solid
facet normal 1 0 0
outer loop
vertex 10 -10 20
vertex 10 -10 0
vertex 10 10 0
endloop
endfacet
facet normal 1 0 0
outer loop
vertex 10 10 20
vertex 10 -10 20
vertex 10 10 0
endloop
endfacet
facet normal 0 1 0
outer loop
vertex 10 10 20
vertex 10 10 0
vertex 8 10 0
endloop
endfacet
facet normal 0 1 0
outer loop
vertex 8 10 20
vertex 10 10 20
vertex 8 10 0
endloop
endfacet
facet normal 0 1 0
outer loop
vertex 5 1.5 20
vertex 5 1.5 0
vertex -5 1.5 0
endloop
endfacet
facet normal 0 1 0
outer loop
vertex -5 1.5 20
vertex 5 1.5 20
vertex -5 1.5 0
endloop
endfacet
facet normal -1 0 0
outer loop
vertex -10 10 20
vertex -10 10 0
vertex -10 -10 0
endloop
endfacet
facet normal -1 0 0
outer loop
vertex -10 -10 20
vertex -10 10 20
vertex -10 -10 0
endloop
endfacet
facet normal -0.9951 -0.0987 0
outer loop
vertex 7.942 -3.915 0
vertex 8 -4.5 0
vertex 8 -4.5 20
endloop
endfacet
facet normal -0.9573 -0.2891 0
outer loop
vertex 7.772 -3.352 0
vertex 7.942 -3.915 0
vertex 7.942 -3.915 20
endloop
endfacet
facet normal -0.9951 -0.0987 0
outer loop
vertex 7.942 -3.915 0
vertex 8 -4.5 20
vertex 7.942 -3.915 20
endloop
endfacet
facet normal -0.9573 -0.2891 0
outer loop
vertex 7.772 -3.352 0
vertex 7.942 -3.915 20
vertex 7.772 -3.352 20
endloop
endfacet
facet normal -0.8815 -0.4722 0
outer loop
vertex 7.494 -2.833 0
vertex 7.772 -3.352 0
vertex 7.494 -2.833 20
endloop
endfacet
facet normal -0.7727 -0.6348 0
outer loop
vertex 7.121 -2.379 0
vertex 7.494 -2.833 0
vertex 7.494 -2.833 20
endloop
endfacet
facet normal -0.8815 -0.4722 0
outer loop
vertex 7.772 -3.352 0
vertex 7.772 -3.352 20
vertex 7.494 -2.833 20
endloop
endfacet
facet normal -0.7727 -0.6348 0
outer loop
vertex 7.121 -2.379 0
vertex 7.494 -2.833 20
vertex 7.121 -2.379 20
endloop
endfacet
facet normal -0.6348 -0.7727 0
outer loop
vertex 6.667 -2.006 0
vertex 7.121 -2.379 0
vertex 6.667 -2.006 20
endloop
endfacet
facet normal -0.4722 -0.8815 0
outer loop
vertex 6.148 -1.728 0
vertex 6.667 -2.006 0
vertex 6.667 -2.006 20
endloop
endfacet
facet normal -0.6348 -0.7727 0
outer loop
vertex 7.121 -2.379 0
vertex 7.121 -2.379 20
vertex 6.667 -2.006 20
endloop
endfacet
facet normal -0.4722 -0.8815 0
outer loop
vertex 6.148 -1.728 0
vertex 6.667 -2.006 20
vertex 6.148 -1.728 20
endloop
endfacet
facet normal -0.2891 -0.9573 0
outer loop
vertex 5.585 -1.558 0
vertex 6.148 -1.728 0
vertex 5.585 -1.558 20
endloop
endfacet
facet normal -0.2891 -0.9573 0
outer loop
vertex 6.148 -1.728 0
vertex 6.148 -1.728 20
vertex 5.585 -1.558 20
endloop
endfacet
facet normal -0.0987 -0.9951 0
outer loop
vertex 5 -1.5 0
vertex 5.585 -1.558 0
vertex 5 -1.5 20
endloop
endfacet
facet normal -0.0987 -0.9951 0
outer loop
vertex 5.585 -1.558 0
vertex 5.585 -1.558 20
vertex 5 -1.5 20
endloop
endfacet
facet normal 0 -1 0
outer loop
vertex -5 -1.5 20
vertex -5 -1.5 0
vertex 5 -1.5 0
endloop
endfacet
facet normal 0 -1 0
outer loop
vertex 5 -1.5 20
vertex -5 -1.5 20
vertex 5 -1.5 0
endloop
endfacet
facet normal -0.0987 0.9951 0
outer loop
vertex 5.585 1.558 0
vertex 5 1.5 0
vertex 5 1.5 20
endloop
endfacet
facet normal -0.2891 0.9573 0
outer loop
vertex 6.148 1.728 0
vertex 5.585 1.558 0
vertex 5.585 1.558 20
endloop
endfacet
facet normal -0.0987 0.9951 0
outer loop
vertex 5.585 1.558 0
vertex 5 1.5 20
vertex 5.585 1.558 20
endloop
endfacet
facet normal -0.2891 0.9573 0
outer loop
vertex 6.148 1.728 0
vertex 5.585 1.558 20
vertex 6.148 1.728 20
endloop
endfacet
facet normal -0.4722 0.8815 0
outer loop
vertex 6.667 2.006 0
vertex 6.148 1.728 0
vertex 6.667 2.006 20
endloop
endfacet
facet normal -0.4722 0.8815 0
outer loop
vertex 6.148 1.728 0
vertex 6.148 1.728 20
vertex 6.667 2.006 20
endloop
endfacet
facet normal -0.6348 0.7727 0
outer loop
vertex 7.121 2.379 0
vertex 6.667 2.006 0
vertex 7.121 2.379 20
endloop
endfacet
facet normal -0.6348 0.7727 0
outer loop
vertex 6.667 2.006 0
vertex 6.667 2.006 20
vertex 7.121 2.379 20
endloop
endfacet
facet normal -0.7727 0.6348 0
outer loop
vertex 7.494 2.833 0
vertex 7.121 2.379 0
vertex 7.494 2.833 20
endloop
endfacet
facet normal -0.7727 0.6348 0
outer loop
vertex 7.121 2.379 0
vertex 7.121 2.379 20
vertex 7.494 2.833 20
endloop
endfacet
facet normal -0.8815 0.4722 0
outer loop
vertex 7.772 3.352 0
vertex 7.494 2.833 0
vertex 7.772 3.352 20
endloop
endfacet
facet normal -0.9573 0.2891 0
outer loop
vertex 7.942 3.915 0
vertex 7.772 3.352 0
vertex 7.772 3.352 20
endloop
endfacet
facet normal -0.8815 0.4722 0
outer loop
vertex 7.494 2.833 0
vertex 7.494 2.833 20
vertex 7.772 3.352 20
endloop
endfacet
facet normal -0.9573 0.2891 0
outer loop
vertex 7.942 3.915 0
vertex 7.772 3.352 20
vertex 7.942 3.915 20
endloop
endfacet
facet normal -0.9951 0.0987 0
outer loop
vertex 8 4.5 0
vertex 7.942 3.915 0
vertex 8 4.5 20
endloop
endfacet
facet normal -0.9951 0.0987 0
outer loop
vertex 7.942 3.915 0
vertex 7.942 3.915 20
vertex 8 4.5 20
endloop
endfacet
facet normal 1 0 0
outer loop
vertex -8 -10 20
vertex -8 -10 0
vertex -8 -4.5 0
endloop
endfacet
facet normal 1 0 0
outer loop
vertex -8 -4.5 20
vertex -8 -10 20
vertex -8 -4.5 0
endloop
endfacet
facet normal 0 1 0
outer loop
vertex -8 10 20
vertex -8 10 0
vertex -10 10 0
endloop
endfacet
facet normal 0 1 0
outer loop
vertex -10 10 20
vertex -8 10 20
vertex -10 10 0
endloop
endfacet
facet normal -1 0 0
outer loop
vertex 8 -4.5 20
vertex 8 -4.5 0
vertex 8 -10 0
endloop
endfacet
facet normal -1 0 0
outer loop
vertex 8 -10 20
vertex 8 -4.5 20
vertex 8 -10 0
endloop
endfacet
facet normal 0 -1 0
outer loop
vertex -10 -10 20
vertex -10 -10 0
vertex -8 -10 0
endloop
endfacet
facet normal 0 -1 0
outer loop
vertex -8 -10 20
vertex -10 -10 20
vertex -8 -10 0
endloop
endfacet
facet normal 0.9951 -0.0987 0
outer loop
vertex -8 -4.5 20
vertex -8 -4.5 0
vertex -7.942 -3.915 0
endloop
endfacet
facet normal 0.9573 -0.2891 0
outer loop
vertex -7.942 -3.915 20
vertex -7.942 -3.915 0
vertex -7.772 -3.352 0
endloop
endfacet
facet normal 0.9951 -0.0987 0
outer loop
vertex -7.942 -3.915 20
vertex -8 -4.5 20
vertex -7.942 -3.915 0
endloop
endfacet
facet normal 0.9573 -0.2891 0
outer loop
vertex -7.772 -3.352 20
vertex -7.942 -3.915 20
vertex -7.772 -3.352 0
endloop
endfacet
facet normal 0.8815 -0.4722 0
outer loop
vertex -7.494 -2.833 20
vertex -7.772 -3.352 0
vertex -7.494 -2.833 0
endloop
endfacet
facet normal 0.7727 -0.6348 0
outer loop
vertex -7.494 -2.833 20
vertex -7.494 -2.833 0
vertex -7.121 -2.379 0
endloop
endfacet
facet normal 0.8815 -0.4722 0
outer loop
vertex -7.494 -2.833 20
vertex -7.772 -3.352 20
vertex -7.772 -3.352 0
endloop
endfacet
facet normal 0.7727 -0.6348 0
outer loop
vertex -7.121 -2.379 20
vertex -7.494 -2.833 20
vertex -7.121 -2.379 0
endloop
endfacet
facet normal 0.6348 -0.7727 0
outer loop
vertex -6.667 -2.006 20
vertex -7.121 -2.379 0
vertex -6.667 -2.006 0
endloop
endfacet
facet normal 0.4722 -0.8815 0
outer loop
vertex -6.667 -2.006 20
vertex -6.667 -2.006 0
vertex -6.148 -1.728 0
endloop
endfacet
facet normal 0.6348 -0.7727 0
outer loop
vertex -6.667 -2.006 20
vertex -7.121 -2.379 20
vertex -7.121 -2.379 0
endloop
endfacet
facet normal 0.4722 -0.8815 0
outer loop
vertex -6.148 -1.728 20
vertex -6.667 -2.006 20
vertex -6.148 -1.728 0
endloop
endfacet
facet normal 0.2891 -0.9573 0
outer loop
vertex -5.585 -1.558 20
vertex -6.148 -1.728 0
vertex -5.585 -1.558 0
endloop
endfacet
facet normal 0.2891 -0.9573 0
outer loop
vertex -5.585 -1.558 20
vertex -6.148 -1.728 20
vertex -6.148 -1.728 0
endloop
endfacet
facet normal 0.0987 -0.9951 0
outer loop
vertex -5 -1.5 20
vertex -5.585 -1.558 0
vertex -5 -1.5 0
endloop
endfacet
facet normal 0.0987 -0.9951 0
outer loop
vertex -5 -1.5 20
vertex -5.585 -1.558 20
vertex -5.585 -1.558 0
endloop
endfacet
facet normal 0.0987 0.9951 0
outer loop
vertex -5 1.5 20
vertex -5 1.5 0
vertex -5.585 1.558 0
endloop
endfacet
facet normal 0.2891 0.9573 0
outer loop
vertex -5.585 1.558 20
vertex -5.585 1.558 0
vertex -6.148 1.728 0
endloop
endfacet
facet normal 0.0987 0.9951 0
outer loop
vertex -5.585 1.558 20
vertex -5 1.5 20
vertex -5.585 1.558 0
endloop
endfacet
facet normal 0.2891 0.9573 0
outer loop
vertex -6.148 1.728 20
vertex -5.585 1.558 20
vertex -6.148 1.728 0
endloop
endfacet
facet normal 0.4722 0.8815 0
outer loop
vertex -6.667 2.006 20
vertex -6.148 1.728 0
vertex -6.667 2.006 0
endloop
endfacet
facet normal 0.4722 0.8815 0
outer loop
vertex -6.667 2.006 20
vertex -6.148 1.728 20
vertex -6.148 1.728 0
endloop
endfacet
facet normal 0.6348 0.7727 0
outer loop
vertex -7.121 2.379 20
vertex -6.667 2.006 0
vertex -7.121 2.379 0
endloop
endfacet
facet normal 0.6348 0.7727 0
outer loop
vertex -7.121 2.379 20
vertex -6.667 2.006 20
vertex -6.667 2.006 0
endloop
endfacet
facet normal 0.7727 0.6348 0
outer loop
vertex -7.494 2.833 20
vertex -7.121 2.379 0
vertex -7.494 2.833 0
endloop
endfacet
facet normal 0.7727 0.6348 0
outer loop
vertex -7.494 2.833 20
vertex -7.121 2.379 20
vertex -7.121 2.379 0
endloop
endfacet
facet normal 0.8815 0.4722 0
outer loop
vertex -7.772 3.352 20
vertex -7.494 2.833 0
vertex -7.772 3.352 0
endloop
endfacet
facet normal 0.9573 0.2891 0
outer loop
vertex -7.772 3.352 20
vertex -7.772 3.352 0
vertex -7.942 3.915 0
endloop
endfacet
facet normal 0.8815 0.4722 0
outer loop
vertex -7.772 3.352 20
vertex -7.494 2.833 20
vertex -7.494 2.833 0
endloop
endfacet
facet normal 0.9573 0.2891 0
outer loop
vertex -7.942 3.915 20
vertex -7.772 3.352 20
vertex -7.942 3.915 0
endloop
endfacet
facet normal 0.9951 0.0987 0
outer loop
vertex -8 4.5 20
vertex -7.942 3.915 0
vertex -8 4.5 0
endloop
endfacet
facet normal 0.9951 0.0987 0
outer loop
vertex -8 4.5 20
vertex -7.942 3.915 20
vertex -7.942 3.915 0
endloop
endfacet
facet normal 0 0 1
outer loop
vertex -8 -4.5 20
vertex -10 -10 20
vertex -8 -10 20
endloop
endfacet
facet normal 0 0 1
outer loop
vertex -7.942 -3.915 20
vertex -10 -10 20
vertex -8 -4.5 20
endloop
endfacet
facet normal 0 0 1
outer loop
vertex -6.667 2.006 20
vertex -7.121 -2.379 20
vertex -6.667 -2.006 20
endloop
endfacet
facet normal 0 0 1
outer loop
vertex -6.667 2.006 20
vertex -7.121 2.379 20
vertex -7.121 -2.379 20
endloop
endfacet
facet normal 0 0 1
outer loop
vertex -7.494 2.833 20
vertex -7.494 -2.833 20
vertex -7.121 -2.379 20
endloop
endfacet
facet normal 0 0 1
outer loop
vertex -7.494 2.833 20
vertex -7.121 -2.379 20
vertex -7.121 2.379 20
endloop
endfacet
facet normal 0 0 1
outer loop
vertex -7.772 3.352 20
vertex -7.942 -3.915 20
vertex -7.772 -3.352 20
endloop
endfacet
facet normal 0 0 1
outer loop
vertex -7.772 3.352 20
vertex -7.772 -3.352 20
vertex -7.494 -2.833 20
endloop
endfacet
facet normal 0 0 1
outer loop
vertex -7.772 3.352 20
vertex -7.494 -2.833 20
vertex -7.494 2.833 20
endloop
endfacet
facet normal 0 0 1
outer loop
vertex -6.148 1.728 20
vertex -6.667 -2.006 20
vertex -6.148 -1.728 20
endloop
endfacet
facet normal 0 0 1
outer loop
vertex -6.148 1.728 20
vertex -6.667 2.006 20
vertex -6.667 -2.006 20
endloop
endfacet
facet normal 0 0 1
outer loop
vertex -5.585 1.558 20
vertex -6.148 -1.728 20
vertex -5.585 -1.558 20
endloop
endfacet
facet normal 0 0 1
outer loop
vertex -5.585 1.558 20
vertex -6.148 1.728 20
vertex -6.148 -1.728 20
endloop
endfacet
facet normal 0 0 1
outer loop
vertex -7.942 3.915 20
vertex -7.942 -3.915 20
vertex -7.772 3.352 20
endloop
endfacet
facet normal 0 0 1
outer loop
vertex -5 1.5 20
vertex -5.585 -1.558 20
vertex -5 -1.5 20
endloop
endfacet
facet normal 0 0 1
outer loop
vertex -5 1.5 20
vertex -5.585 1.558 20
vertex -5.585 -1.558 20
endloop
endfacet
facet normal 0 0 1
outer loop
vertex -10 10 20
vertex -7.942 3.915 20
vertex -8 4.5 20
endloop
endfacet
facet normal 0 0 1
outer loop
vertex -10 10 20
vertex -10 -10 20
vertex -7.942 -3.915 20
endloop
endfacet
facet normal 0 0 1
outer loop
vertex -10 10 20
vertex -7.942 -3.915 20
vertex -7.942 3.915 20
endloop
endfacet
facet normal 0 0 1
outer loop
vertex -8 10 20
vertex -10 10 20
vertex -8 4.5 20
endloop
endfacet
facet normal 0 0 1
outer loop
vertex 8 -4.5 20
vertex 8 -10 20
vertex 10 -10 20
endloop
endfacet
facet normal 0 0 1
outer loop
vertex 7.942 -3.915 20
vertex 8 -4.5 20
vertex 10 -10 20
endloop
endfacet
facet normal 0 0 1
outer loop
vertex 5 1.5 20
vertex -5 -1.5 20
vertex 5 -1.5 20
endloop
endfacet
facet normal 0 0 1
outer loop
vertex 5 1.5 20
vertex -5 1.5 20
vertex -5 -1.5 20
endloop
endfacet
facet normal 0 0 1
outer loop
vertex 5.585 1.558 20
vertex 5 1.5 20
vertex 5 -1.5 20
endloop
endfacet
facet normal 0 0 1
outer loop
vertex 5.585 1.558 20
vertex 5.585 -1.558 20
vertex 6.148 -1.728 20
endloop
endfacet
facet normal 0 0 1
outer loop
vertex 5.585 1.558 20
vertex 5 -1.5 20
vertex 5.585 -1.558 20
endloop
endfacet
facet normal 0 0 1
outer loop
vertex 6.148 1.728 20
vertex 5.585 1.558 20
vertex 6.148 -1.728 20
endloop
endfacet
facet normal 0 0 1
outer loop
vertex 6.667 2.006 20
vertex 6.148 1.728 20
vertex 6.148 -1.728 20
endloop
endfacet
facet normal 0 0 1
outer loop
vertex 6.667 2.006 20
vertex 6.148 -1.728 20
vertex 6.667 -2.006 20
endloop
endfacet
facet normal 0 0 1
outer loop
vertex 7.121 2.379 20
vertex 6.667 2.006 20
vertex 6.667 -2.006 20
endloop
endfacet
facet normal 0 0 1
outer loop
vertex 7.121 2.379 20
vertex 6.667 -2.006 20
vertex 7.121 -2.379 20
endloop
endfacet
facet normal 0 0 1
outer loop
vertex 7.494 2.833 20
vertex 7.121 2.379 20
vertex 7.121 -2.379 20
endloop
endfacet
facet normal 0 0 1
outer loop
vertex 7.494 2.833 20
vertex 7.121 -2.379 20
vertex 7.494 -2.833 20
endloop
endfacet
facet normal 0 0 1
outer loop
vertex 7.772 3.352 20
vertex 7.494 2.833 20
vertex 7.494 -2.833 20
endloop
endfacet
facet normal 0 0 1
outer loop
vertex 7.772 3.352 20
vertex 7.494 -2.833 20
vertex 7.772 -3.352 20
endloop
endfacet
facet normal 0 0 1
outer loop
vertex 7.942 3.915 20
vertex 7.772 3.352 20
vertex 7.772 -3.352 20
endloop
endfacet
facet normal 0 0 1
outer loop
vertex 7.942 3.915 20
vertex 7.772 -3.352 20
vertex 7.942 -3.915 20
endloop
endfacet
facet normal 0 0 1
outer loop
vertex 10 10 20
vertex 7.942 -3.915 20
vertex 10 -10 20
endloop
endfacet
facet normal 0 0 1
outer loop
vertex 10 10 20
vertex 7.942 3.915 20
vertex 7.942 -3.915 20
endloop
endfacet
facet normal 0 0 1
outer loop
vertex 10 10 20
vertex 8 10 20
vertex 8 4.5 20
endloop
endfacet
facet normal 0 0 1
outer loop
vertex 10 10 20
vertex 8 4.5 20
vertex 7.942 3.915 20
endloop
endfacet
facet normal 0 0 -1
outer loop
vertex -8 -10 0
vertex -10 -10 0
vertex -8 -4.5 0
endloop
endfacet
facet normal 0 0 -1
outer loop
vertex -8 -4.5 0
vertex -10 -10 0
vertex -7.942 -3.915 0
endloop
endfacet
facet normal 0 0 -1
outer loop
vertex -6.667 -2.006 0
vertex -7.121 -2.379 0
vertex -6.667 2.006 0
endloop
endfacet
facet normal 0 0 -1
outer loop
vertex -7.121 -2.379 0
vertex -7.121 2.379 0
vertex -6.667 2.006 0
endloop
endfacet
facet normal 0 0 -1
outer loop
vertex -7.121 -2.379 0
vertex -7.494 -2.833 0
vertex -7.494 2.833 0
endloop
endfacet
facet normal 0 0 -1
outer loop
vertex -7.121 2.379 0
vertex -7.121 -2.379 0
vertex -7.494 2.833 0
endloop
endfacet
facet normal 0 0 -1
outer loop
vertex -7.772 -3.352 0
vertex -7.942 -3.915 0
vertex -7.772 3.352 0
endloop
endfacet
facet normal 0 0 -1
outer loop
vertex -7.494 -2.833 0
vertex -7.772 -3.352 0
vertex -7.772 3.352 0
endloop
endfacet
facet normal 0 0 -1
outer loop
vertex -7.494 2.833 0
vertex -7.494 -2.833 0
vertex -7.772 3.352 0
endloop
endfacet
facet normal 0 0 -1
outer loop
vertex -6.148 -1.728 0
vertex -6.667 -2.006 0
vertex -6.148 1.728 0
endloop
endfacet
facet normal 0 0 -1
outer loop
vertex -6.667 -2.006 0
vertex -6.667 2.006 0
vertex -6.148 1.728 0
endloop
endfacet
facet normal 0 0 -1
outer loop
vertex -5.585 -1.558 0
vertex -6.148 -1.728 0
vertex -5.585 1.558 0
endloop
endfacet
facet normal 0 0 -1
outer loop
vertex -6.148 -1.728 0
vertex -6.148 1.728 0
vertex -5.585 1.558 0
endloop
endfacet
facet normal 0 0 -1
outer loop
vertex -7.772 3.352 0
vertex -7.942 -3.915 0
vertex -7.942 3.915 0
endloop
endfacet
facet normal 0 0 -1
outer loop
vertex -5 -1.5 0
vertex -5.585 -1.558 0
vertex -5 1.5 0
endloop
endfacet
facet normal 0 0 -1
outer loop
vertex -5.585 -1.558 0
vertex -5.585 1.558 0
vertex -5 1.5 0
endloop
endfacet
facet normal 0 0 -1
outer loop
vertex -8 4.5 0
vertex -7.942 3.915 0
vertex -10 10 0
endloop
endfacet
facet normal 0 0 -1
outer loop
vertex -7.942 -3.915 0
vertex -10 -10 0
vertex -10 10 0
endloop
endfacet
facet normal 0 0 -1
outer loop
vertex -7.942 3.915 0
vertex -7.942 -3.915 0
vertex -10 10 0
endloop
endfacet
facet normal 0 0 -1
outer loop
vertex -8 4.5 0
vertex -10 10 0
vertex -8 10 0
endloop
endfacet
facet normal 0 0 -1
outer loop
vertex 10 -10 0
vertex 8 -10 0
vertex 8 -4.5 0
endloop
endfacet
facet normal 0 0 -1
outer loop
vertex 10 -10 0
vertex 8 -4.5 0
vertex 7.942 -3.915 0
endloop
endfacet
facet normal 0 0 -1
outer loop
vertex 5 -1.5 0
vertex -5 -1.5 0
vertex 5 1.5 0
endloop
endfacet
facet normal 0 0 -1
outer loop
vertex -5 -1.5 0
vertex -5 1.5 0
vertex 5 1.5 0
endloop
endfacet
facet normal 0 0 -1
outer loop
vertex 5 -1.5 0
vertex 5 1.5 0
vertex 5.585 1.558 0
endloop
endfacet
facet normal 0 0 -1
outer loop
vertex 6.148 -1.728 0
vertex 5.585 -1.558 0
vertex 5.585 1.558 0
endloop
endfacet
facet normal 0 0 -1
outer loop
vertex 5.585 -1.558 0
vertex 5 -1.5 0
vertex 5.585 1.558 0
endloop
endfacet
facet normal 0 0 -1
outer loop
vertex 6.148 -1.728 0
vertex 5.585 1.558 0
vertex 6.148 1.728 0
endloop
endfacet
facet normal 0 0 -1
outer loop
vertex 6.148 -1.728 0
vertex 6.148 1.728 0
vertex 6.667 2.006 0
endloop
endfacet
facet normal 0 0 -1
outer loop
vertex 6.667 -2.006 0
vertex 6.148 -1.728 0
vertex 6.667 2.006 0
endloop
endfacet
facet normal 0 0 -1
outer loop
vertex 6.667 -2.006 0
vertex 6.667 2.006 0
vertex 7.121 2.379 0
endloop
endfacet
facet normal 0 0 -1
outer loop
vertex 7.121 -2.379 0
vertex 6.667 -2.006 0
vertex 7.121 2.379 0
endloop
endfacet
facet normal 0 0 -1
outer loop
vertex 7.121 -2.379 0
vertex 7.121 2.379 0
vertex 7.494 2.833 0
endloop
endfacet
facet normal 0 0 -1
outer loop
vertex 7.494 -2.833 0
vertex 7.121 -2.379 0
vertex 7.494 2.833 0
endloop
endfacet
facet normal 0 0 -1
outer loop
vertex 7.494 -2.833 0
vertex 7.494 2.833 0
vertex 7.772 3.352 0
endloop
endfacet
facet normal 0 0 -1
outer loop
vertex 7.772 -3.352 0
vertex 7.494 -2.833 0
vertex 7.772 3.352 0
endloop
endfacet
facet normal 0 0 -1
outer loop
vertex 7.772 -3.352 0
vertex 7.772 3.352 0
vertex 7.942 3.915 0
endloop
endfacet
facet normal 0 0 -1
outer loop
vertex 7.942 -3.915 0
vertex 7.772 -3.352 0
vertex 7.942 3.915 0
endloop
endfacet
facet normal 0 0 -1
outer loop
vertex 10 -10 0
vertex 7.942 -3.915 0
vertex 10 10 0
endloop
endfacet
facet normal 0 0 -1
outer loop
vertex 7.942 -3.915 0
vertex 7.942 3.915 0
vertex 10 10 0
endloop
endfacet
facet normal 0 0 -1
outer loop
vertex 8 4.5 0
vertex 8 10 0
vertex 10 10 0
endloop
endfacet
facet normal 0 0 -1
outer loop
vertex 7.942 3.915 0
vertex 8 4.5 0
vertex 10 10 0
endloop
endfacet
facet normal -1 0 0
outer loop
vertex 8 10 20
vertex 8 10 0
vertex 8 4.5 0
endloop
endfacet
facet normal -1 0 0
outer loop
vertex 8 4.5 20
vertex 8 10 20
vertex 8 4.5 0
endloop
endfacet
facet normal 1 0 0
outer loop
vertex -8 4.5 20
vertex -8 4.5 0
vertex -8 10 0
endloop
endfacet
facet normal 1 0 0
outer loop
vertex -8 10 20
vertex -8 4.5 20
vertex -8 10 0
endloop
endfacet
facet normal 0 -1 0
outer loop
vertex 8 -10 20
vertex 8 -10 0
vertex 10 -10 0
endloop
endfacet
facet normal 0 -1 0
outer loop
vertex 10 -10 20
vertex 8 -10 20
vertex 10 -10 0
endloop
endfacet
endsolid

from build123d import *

# Parameters (mm, degrees)
BOSS_EXTRUDE2_DEPTH = 20
FILLET1_R           = 3
FILLET2_R           = 3


with BuildPart() as part:
    # Sketch2 → Boss-Extrude2 (new body)
    with BuildSketch(Plane.XY):
        Polygon((-10, -10), (-8, -10), (-8, -1.5), (8, -1.5), (8, -10), (10, -10), (10, 10), (8, 10), (8, 1.5), (-8, 1.5), (-8, 10), (-10, 10), align=None)
    extrude(amount=BOSS_EXTRUDE2_DEPTH)

    # Fillet1
    fillet1_edges = [part.edges().sort_by_distance(p)[0] for p in [
        (-8, 1.5, 10),
    ]]
    fillet(fillet1_edges, radius=FILLET1_R)

    # Fillet2
    fillet2_edges = [part.edges().sort_by_distance(p)[0] for p in [
        (8, 1.5, 10),
        (8, -1.5, 10),
        (-8, -1.5, 10),
    ]]
    fillet(fillet2_edges, radius=FILLET2_R)


solid = part.part
